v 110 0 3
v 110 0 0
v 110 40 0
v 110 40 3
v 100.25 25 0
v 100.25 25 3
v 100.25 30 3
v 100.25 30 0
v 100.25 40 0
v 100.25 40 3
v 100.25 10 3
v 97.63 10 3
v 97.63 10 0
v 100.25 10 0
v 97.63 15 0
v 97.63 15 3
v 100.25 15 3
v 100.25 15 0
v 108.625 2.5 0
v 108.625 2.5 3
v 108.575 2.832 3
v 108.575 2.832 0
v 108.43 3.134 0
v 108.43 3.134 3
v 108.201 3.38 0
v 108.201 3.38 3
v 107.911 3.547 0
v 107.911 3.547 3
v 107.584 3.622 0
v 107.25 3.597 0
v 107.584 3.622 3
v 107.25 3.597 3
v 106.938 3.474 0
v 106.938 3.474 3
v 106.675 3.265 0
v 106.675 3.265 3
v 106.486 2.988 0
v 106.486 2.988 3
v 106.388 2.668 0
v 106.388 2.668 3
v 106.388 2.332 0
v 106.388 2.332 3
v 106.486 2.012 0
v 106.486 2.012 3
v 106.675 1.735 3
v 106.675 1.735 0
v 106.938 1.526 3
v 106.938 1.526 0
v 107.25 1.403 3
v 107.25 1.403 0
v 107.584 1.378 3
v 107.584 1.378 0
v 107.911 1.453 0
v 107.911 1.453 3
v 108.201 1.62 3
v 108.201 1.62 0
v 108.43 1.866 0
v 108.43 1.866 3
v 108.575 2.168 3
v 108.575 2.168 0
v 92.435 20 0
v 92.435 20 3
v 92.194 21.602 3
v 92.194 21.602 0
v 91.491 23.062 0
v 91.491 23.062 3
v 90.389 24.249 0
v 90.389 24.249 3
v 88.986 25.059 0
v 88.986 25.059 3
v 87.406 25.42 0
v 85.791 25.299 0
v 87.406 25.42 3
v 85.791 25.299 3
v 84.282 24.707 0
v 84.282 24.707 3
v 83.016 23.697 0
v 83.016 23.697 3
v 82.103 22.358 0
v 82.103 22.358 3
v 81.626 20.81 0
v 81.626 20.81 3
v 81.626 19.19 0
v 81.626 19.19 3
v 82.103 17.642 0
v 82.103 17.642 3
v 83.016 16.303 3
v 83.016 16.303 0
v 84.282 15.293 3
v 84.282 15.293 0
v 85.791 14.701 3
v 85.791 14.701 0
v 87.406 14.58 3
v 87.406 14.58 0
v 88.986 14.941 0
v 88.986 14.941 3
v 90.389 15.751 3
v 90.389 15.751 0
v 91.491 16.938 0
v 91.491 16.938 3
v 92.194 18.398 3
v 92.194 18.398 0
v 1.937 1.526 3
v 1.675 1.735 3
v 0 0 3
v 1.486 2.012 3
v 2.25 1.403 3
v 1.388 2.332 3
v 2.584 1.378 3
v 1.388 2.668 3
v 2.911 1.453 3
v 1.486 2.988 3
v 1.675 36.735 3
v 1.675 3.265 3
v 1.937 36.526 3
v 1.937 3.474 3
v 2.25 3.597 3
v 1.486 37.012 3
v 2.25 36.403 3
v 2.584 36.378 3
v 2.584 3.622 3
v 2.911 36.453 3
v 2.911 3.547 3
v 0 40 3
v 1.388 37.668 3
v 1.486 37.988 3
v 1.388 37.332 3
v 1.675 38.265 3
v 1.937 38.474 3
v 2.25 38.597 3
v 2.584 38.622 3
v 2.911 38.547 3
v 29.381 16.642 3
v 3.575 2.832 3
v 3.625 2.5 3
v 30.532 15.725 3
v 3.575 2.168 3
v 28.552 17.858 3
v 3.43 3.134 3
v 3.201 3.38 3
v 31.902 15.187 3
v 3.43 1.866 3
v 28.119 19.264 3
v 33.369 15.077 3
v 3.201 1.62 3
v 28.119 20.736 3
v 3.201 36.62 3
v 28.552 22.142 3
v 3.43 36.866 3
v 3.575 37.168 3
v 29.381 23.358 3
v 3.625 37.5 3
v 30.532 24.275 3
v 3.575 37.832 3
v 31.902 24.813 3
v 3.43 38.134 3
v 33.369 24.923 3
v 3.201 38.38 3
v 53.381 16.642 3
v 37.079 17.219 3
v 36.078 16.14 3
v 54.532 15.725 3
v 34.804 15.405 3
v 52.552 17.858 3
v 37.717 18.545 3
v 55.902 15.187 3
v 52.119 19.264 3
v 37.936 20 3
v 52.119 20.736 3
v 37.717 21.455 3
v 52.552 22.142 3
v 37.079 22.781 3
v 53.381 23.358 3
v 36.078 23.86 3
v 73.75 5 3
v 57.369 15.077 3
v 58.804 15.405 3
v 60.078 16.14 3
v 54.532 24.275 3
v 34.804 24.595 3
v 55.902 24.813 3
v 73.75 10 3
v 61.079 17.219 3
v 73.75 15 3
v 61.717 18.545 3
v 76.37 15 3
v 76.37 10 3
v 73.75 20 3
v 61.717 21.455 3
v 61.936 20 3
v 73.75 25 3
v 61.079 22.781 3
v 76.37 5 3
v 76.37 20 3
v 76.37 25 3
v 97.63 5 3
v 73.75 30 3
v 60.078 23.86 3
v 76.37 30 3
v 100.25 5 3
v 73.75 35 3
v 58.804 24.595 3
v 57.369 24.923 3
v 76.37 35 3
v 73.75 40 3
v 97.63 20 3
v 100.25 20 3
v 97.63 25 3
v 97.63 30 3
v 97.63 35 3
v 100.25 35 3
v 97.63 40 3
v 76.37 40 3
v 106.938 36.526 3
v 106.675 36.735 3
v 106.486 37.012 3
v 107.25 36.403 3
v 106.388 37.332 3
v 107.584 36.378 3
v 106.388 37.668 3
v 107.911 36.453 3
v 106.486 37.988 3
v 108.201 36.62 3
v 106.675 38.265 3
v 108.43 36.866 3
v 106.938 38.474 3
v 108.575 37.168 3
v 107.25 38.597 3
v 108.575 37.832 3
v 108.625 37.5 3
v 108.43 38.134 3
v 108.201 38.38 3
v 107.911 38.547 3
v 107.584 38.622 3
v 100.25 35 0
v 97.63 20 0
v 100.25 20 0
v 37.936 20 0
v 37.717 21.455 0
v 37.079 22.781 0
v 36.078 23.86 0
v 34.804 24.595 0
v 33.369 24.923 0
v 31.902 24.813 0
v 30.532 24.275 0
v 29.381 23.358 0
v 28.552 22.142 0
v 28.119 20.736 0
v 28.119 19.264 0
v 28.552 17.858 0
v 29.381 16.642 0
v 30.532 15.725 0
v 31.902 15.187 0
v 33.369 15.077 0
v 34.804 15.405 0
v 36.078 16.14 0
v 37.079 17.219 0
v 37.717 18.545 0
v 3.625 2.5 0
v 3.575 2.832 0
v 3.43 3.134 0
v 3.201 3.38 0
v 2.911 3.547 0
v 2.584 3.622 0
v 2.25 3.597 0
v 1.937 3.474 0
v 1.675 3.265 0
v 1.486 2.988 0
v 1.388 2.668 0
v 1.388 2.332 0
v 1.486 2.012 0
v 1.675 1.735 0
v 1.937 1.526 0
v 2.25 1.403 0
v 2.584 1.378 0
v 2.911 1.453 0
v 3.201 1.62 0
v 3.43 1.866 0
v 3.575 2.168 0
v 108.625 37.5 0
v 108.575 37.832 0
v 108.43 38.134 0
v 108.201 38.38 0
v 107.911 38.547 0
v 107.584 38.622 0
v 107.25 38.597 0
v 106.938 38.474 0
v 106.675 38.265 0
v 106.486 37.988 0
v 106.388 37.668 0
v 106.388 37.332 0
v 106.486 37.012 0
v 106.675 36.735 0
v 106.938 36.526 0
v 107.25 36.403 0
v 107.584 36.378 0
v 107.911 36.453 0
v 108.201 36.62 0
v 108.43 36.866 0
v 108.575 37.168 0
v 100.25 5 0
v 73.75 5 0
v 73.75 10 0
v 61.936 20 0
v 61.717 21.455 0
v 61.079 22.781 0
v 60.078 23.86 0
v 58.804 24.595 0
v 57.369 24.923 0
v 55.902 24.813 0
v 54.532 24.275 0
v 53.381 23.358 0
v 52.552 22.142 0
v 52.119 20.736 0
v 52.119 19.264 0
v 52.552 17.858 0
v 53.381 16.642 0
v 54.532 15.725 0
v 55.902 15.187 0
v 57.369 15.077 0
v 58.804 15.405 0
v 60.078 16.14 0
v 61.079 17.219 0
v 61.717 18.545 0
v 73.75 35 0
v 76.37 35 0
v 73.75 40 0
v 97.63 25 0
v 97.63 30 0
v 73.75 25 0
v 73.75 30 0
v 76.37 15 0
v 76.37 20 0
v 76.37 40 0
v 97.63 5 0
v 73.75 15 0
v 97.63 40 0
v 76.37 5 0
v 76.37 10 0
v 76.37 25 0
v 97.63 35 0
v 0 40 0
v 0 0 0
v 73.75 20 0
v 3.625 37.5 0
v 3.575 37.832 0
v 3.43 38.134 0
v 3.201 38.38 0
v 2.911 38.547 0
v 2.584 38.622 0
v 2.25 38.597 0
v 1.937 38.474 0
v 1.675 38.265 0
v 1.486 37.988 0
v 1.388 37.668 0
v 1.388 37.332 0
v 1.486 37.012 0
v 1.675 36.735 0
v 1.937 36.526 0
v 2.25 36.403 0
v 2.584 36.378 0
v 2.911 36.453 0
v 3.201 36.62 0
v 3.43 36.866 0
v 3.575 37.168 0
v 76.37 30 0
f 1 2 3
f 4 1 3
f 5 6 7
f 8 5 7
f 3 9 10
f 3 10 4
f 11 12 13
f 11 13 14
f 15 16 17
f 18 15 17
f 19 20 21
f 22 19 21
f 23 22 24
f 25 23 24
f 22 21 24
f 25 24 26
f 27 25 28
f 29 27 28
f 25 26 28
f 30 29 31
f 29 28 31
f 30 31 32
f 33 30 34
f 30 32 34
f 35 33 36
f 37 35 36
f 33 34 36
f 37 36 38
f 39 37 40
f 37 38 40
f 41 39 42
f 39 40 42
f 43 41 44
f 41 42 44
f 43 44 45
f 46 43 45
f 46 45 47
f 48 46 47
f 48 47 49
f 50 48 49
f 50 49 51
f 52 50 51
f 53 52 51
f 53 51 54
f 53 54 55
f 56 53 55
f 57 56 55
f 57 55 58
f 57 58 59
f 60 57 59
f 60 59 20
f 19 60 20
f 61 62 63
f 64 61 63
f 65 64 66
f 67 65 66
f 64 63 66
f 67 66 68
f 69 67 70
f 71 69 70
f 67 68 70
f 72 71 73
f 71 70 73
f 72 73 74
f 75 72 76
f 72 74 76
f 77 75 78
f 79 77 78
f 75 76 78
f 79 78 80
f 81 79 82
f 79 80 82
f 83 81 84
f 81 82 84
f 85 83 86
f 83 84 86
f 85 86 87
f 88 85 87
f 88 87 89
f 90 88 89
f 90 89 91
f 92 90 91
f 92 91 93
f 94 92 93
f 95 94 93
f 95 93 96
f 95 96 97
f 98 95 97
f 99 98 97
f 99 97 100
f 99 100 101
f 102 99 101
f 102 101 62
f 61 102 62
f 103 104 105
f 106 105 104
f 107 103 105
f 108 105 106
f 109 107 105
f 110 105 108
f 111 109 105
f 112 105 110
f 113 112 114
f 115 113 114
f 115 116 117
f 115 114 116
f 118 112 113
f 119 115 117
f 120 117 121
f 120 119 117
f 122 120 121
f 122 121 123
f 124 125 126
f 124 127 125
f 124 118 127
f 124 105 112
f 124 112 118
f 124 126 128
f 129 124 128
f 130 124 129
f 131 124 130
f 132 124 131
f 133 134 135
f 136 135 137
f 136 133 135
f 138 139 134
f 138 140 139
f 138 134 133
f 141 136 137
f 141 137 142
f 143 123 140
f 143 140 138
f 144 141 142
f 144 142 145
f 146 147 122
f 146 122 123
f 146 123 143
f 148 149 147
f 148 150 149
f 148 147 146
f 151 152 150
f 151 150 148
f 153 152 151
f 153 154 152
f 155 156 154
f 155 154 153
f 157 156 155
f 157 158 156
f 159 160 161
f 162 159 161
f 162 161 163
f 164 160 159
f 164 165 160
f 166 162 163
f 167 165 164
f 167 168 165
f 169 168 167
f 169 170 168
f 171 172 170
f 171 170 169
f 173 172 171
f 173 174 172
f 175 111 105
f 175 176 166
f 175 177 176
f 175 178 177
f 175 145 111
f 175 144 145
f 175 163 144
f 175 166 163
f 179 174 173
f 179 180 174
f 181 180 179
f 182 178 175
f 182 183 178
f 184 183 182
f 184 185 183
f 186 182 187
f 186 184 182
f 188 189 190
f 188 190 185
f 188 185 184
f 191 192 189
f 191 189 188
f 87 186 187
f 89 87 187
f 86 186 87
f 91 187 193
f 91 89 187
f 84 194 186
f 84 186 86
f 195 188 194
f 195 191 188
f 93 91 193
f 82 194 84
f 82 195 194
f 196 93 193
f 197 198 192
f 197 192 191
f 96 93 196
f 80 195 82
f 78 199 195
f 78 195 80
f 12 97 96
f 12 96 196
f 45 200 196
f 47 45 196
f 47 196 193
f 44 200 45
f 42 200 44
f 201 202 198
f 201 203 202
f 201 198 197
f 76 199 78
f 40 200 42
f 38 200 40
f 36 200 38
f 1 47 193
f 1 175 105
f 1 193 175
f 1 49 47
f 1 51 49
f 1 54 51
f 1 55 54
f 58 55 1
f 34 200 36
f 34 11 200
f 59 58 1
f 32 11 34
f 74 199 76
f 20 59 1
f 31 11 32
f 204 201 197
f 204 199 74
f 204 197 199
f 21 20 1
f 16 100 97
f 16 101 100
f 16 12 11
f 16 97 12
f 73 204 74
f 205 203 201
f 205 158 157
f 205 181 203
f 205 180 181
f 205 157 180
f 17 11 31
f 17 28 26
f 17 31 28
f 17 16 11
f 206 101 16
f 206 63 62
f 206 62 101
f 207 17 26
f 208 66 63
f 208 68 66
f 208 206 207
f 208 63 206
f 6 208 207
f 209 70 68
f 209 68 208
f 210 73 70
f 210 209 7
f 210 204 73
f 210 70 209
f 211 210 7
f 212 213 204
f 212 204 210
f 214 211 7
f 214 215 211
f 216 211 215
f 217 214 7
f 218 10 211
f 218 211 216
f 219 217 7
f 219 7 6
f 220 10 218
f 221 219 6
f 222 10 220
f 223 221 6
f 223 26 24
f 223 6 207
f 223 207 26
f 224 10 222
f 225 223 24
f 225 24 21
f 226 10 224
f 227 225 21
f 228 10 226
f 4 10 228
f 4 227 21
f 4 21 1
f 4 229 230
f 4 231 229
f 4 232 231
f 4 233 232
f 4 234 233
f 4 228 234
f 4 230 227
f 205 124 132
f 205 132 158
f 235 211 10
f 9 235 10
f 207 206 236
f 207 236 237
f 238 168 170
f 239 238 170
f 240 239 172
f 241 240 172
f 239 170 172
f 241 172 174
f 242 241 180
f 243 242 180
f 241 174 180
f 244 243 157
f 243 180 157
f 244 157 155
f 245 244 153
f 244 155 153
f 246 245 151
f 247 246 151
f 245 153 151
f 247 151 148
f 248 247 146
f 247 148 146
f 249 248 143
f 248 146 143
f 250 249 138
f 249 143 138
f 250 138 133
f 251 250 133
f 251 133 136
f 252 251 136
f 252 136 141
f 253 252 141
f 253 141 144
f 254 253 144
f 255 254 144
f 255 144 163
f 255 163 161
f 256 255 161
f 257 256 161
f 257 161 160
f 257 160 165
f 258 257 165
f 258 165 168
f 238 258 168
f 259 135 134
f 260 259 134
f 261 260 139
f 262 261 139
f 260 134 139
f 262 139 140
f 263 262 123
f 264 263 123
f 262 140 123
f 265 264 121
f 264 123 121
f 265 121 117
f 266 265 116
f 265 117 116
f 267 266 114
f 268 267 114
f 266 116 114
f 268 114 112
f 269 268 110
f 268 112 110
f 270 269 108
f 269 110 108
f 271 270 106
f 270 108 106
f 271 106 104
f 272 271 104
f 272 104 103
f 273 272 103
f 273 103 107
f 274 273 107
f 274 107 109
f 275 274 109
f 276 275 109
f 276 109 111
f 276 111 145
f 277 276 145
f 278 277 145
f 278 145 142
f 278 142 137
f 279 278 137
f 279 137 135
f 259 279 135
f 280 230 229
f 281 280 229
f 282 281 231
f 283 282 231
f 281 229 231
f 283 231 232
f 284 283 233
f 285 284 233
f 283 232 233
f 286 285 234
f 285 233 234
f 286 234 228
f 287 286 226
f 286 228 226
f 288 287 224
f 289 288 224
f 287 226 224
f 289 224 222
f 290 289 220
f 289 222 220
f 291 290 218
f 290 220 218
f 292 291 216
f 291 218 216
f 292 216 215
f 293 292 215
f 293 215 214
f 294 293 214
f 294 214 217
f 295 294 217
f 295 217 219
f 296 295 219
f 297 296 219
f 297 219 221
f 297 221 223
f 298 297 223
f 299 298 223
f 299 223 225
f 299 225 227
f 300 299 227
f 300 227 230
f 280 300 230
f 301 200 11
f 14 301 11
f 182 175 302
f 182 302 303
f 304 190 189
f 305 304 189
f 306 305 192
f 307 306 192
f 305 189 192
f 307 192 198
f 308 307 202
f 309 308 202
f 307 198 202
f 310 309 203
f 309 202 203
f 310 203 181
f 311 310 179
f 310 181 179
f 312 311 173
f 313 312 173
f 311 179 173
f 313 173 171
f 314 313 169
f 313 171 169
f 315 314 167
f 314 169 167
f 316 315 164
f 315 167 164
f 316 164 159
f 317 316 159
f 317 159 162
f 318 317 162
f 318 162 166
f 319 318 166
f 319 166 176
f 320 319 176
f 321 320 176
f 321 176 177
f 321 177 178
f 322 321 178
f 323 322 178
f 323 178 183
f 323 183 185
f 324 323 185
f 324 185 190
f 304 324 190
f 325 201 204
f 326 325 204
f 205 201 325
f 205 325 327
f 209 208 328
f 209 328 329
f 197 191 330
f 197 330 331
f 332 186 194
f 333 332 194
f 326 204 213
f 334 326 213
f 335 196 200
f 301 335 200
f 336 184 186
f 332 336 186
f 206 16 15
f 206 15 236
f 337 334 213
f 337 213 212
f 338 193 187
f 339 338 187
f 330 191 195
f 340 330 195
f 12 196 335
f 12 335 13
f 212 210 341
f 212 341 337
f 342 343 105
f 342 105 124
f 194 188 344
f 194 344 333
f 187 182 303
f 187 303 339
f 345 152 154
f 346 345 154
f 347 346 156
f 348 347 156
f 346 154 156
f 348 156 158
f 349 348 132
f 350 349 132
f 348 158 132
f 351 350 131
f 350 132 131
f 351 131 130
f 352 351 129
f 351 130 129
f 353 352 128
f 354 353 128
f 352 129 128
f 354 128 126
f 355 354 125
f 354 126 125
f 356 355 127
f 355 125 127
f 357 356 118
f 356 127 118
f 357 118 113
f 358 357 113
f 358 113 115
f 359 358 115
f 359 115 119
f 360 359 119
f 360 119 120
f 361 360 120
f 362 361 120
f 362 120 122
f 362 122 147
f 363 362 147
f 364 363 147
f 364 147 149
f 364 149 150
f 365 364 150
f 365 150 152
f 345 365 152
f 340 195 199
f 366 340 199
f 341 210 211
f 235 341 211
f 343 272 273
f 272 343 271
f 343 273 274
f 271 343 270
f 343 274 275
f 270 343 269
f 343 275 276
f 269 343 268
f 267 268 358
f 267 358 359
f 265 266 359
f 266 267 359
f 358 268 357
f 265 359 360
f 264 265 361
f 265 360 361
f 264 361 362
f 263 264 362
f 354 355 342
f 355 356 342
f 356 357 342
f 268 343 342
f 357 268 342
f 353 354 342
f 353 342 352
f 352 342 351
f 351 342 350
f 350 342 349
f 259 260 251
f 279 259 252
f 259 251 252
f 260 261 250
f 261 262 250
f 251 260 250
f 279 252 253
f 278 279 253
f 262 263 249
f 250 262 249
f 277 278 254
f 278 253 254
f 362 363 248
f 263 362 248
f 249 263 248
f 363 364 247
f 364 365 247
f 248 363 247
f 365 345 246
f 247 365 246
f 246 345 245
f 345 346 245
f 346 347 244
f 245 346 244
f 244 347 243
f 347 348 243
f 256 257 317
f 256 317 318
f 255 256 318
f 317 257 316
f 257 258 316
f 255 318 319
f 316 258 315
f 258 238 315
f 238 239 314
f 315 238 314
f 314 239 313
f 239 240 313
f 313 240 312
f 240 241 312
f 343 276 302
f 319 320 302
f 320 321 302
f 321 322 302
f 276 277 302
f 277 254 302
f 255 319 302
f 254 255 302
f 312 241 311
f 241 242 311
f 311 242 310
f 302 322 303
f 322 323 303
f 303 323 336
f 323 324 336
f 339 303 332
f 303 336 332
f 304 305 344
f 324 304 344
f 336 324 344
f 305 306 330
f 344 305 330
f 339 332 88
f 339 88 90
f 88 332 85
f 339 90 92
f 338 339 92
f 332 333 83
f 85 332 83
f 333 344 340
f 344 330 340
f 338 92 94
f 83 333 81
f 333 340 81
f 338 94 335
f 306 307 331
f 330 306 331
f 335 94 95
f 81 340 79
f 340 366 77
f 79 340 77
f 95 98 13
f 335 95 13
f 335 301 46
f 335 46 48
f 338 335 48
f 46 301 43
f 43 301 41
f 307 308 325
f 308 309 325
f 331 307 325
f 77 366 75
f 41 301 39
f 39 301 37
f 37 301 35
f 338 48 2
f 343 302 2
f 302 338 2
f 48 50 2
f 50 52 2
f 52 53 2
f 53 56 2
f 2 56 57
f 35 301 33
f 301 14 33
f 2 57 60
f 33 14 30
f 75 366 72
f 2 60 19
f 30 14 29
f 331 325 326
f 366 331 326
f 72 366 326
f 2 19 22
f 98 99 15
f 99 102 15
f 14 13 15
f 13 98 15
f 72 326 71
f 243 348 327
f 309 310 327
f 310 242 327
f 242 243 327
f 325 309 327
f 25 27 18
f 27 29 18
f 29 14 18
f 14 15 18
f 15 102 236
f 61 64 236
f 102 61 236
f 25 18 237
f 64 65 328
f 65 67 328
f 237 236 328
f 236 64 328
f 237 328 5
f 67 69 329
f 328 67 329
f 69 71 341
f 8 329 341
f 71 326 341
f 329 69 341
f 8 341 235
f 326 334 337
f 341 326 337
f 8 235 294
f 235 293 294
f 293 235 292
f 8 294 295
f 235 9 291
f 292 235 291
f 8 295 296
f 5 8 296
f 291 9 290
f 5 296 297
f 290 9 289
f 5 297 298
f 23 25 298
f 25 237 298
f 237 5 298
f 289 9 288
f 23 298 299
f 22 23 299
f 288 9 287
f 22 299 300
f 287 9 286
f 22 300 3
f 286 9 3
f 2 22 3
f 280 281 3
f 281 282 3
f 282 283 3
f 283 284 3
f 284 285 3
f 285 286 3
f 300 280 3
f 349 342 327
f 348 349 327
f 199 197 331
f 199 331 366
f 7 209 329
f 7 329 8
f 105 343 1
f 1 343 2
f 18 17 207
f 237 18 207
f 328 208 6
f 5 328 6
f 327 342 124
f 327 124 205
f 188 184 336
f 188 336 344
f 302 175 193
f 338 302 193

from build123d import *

# Parameters (mm, degrees)
SKETCH1_W           = 110
SKETCH1_H           = 40
BOSS_EXTRUDE1_DEPTH = 3
SKETCH2_W           = 2.62
SKETCH2_H           = 5
SKETCH2_R           = 4.9365
SKETCH2_R_2         = 1.125
SKETCH2_R_3         = 5.435
CUT_EXTRUDE1_DEPTH  = 4


with BuildPart() as part:
    # Sketch1 → Boss-Extrude1 (new body)
    with BuildSketch(Plane.XY):
        with Locations((55, 20)):
            Rectangle(SKETCH1_W, SKETCH1_H)
    extrude(amount=BOSS_EXTRUDE1_DEPTH)

    # Sketch2 → Cut-Extrude1 (cut, through all)
    with BuildSketch(Plane.XY.offset(3)):
        with Locations((98.94, 37.5)):
            Rectangle(SKETCH2_W, SKETCH2_H)
        with Locations((75.06, 37.5)):
            Rectangle(SKETCH2_W, SKETCH2_H)
        with Locations((75.06, 27.5)):
            Rectangle(SKETCH2_W, SKETCH2_H)
        with Locations((75.06, 17.5)):
            Rectangle(SKETCH2_W, SKETCH2_H)
        with Locations((75.06, 7.5)):
            Rectangle(SKETCH2_W, SKETCH2_H)
        with Locations((98.94, 27.5)):
            Rectangle(SKETCH2_W, SKETCH2_H)
        with Locations((98.94, 17.5)):
            Rectangle(SKETCH2_W, SKETCH2_H)
        with Locations((98.94, 7.5)):
            Rectangle(SKETCH2_W, SKETCH2_H)
        with Locations((33, 20)):
            Circle(SKETCH2_R)
        with Locations((57, 20)):
            Circle(SKETCH2_R)
        with Locations((2.5, 37.5)):
            Circle(SKETCH2_R_2)
        with Locations((107.5, 37.5)):
            Circle(SKETCH2_R_2)
        with Locations((107.5, 2.5)):
            Circle(SKETCH2_R_2)
        with Locations((2.5, 2.5)):
            Circle(SKETCH2_R_2)
        with Locations((87, 20)):
            Circle(SKETCH2_R_3)
    extrude(amount=-CUT_EXTRUDE1_DEPTH, mode=Mode.SUBTRACT)


solid = part.part
